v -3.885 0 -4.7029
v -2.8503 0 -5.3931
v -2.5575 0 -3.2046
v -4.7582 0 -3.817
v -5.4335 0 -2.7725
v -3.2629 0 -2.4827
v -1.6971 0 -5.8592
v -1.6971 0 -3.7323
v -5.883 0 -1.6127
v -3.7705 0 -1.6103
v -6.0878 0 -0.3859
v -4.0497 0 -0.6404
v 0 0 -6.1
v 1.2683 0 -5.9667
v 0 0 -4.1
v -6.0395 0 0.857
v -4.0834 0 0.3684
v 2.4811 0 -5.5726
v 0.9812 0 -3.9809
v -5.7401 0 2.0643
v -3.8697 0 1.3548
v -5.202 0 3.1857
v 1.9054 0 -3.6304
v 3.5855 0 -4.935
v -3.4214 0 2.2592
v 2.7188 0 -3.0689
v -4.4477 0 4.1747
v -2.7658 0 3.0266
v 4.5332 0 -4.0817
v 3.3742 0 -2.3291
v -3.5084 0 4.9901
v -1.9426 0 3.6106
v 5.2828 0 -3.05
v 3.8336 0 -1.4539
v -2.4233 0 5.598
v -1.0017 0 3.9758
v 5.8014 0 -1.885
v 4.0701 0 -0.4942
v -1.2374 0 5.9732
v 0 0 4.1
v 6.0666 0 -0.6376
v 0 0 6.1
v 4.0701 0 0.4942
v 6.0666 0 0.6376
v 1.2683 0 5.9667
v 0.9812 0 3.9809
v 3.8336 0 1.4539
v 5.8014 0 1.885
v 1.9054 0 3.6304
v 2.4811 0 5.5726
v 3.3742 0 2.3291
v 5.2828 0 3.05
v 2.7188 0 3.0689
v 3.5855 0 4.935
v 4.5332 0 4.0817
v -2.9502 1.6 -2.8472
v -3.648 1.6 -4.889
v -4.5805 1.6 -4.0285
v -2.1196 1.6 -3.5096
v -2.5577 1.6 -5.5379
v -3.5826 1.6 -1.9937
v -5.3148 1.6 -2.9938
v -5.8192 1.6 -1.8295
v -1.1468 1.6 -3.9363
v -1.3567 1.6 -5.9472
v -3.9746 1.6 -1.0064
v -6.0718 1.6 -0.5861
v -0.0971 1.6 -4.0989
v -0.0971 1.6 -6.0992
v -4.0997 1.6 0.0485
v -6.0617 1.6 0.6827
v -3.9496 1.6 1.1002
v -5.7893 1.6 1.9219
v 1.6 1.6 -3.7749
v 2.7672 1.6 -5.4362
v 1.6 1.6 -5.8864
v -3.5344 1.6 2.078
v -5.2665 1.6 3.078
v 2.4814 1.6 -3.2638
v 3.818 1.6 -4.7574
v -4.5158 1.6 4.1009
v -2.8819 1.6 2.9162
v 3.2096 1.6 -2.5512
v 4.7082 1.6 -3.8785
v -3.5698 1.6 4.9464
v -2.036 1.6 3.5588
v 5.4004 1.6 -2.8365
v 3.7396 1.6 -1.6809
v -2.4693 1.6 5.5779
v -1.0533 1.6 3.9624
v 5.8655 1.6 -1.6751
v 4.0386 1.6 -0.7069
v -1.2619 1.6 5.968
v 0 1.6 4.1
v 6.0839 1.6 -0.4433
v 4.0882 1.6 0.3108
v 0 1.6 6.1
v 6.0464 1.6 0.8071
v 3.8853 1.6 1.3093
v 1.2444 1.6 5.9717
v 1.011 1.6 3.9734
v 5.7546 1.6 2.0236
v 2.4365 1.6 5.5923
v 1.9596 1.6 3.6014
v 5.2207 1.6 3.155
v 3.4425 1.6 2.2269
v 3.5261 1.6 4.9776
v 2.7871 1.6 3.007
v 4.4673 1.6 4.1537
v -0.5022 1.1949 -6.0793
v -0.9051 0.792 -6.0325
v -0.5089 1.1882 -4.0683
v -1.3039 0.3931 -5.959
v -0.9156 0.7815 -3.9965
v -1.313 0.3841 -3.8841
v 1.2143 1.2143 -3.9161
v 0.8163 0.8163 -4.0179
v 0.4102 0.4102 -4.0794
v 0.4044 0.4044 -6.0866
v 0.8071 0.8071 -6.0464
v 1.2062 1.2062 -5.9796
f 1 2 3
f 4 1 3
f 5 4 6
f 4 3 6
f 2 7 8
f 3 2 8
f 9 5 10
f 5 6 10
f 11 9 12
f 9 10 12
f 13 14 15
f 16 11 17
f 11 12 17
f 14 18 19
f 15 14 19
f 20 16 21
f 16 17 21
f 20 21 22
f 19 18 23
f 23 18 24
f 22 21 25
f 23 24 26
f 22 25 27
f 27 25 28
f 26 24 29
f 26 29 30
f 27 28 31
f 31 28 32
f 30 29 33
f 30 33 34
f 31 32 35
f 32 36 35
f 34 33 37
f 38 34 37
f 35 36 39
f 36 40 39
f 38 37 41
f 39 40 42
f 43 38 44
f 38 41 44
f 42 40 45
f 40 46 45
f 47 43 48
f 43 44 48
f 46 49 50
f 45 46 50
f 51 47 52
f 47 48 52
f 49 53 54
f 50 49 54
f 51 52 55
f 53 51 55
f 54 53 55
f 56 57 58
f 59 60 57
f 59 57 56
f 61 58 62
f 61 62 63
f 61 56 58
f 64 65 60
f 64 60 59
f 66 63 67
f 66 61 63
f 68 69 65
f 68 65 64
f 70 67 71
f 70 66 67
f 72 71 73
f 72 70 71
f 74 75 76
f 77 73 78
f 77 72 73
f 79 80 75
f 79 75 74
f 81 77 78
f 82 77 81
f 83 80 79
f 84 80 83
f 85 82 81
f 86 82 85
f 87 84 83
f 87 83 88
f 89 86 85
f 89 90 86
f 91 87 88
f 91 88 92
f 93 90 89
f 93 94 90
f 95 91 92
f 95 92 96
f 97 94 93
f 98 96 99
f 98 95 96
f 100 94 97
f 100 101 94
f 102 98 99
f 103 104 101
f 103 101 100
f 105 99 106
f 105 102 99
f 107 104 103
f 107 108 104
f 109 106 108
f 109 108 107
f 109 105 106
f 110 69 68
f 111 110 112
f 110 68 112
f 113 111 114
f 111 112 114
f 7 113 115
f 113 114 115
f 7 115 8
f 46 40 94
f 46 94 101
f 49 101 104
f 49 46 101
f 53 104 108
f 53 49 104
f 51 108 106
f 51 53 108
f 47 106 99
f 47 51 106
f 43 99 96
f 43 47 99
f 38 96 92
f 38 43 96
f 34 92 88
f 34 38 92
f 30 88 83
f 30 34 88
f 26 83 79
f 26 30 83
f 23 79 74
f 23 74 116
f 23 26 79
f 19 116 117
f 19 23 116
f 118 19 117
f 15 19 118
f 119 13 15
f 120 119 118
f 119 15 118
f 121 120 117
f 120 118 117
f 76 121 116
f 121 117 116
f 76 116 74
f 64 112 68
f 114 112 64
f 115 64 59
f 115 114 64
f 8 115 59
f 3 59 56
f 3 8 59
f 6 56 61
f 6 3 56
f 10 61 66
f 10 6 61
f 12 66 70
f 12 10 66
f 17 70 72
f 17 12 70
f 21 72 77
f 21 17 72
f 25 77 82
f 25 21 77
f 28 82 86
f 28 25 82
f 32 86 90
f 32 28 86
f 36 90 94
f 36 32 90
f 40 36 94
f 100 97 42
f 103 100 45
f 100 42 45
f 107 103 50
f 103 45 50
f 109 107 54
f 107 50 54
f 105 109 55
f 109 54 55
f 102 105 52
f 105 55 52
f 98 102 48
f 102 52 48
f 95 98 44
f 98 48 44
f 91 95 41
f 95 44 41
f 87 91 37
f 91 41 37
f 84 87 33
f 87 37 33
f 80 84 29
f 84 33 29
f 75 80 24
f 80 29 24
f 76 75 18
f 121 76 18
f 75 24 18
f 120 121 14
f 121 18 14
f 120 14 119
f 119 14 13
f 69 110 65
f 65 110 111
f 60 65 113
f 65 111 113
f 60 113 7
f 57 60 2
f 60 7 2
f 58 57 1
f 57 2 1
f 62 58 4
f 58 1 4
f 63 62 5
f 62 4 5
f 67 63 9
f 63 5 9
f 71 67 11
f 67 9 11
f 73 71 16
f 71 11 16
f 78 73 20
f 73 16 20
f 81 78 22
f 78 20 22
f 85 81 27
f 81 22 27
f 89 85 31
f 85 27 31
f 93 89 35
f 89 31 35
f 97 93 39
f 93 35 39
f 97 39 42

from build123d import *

# Parameters (mm, degrees)
SKETCH_1_R          = 6.1
SKETCH_1_R_2        = 4.1
EXTRUDE_1_DEPTH     = 1.6
CUT_EXTRUDE_1_DEPTH = 9.773824708


with BuildPart() as part:
    # Эскиз1 → Бобышка-Вытянуть1 (new body)
    with BuildSketch(Plane(origin=(0, 0, 0), x_dir=(1, 0, 0), z_dir=(0, 1, 0))):
        with Locations(Location((0, 0, 0), (0, 0, 270))):
            Circle(SKETCH_1_R)
        with Locations(Location((0, 0, 0), (0, 0, 270))):
            Circle(SKETCH_1_R_2, mode=Mode.SUBTRACT)
    extrude(amount=EXTRUDE_1_DEPTH)

    # Эскиз2 → Вырез-Вытянуть1 (cut, through all)
    with BuildSketch(Plane.XY):
        Polygon((0, 0), (1.6, 1.6), (-0.097056275, 1.6), (-1.697056275, 0), align=None)
    extrude(amount=-CUT_EXTRUDE_1_DEPTH, mode=Mode.SUBTRACT)


solid = part.part
